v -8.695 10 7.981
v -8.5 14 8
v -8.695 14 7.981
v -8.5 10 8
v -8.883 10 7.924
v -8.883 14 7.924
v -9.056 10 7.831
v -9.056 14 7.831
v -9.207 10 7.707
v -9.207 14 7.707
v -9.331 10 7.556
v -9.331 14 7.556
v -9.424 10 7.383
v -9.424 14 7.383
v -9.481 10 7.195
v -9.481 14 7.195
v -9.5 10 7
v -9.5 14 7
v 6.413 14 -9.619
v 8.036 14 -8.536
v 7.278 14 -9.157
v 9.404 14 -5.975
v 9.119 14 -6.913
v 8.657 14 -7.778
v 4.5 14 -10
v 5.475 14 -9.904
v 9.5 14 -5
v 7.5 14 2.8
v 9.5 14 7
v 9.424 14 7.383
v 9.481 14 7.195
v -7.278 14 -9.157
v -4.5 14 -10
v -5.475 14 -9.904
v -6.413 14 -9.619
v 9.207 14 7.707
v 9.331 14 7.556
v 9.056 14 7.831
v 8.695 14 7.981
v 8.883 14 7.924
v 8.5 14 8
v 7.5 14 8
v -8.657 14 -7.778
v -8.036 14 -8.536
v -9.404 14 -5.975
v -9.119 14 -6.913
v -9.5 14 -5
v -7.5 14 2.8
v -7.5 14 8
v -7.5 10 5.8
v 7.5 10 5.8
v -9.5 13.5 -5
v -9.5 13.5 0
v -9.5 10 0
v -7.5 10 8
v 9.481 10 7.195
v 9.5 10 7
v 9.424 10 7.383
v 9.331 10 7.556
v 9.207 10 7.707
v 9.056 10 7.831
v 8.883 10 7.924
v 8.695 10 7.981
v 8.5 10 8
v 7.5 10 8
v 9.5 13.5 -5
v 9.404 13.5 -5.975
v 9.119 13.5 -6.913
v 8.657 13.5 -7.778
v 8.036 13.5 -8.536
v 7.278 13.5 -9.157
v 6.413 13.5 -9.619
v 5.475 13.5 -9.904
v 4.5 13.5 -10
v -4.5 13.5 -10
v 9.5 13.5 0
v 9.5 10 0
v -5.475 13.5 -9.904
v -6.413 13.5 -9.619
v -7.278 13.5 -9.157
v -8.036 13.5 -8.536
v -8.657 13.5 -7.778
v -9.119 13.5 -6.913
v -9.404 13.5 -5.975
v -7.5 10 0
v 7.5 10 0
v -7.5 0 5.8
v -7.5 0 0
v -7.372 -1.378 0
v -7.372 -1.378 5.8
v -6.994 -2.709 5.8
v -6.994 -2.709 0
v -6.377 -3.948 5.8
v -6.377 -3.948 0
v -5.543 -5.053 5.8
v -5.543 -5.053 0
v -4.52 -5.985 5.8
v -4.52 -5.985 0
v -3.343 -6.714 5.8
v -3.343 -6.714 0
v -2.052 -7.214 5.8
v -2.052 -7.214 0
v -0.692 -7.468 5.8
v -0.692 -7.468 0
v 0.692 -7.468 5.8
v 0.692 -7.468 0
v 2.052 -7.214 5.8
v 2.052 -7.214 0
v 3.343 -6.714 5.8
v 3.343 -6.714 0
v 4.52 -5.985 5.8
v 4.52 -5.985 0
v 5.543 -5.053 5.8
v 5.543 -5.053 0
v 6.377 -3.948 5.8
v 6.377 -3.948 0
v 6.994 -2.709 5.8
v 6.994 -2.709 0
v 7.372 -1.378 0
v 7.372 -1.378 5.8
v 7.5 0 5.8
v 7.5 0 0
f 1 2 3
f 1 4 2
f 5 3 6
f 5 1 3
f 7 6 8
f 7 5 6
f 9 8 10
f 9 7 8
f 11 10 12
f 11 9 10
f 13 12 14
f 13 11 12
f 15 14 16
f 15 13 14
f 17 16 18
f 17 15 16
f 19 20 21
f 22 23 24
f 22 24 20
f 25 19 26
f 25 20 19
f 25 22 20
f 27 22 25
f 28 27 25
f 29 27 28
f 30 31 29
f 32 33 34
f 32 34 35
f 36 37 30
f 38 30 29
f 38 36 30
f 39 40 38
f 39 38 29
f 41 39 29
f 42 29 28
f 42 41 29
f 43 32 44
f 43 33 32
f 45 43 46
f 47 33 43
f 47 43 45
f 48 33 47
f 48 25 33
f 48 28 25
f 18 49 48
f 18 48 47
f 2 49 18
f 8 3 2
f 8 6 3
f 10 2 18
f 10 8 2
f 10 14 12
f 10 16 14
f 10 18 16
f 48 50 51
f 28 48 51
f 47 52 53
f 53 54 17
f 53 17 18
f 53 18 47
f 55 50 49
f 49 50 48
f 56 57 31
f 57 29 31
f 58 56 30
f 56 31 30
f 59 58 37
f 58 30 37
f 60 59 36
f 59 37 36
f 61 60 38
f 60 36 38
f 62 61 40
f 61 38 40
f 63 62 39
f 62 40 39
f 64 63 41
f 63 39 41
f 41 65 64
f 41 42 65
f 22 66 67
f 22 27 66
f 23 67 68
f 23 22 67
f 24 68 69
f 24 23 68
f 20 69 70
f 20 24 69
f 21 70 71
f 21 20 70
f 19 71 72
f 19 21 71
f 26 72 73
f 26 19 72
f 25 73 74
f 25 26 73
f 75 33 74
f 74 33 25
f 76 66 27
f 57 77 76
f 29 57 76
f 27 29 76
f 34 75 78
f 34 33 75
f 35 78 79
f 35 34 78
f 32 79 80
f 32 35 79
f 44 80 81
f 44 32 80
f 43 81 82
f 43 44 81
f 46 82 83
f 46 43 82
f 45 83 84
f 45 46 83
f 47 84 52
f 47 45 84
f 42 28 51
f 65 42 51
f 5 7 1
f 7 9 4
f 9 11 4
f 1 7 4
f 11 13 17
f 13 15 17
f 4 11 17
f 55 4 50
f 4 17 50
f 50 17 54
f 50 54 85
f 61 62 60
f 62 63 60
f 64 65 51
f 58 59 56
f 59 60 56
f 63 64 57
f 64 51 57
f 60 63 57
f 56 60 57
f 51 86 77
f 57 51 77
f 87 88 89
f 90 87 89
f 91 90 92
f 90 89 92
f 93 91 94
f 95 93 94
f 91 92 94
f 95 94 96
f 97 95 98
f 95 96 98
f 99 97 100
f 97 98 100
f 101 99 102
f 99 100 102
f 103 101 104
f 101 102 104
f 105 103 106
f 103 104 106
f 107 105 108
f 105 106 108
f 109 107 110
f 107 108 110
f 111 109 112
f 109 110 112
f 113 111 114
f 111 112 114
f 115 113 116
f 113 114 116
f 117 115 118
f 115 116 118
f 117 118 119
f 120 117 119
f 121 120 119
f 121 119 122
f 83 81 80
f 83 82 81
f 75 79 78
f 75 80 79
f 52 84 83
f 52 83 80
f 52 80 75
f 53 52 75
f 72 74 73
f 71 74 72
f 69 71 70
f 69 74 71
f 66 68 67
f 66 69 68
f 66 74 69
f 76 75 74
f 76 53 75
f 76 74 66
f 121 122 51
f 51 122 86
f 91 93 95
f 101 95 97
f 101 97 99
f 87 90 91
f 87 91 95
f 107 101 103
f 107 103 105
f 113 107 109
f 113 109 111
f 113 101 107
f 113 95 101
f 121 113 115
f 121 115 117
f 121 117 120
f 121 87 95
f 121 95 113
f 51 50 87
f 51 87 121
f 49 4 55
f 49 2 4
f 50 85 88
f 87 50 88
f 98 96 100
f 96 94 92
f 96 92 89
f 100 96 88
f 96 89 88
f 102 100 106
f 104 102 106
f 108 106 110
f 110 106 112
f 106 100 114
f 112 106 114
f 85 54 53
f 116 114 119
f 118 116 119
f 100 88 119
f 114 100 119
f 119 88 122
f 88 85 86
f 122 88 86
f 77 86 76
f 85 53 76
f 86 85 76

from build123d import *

# Parameters (mm, degrees)
F0_W     = 15
F0_H     = 0.5
F1_DEPTH = 5.8
F2_SIZE2 = 4
F2_SIZE  = 3
F0_W_2   = 2
F0_H_2   = 3.5
F3_DEPTH = 8
F4_DEPTH = 10
F5_R     = 1
F6_R     = 5


with BuildPart() as f1:
    # F0 (on Top) → F1 (new body)
    with BuildSketch(Plane.XY):
        with BuildLine():
            Line((-7.5, 10), (-7.5, 0))
            ThreePointArc((-7.5, 0), (0, -7.5), (7.5, 0))
            Line((7.5, 0), (7.5, 10))
            Line((7.5, 10), (7.5, 13.5))
            Line((7.5, 13.5), (-7.5, 13.5))
            Line((-7.5, 13.5), (-7.5, 10))
        make_face()
        with Locations((0, 13.75)):
            Rectangle(F0_W, F0_H)
    extrude(amount=F1_DEPTH)

    # F2
    f2_edges = [f1.edges().sort_by_distance(p)[0] for p in [
        (0, 14, 5.8),
    ]]
    chamfer(f2_edges, length=F2_SIZE, length2=F2_SIZE2)

    # F0 (on Top) → F3 (join)
    with BuildSketch(Plane.XY):
        with Locations((-8.5, 11.75)):
            Rectangle(F0_W_2, F0_H_2)
        with Locations((8.5, 13.75)):
            Rectangle(F0_W_2, F0_H)
        with Locations((8.5, 11.75)):
            Rectangle(F0_W_2, F0_H_2)
        with Locations((-8.5, 13.75)):
            Rectangle(F0_W_2, F0_H)
    extrude(amount=F3_DEPTH)

    # F0 (on Top) → F4 (join)
    with BuildSketch(Plane.XY):
        with Locations((0, 13.75)):
            Rectangle(F0_W, F0_H)
        with Locations((8.5, 13.75)):
            Rectangle(F0_W_2, F0_H)
        with Locations((-8.5, 13.75)):
            Rectangle(F0_W_2, F0_H)
    extrude(amount=-F4_DEPTH)

    # F5
    f5_edges = [f1.edges().sort_by_distance(p)[0] for p in [
        (-9.5, 12, 8),
        (9.5, 12, 8),
    ]]
    fillet(f5_edges, radius=F5_R)

    # F6
    f6_edges = [f1.edges().sort_by_distance(p)[0] for p in [
        (9.5, 13.75, -10),
        (-9.5, 13.75, -10),
    ]]
    fillet(f6_edges, radius=F6_R)


solid = f1.part
